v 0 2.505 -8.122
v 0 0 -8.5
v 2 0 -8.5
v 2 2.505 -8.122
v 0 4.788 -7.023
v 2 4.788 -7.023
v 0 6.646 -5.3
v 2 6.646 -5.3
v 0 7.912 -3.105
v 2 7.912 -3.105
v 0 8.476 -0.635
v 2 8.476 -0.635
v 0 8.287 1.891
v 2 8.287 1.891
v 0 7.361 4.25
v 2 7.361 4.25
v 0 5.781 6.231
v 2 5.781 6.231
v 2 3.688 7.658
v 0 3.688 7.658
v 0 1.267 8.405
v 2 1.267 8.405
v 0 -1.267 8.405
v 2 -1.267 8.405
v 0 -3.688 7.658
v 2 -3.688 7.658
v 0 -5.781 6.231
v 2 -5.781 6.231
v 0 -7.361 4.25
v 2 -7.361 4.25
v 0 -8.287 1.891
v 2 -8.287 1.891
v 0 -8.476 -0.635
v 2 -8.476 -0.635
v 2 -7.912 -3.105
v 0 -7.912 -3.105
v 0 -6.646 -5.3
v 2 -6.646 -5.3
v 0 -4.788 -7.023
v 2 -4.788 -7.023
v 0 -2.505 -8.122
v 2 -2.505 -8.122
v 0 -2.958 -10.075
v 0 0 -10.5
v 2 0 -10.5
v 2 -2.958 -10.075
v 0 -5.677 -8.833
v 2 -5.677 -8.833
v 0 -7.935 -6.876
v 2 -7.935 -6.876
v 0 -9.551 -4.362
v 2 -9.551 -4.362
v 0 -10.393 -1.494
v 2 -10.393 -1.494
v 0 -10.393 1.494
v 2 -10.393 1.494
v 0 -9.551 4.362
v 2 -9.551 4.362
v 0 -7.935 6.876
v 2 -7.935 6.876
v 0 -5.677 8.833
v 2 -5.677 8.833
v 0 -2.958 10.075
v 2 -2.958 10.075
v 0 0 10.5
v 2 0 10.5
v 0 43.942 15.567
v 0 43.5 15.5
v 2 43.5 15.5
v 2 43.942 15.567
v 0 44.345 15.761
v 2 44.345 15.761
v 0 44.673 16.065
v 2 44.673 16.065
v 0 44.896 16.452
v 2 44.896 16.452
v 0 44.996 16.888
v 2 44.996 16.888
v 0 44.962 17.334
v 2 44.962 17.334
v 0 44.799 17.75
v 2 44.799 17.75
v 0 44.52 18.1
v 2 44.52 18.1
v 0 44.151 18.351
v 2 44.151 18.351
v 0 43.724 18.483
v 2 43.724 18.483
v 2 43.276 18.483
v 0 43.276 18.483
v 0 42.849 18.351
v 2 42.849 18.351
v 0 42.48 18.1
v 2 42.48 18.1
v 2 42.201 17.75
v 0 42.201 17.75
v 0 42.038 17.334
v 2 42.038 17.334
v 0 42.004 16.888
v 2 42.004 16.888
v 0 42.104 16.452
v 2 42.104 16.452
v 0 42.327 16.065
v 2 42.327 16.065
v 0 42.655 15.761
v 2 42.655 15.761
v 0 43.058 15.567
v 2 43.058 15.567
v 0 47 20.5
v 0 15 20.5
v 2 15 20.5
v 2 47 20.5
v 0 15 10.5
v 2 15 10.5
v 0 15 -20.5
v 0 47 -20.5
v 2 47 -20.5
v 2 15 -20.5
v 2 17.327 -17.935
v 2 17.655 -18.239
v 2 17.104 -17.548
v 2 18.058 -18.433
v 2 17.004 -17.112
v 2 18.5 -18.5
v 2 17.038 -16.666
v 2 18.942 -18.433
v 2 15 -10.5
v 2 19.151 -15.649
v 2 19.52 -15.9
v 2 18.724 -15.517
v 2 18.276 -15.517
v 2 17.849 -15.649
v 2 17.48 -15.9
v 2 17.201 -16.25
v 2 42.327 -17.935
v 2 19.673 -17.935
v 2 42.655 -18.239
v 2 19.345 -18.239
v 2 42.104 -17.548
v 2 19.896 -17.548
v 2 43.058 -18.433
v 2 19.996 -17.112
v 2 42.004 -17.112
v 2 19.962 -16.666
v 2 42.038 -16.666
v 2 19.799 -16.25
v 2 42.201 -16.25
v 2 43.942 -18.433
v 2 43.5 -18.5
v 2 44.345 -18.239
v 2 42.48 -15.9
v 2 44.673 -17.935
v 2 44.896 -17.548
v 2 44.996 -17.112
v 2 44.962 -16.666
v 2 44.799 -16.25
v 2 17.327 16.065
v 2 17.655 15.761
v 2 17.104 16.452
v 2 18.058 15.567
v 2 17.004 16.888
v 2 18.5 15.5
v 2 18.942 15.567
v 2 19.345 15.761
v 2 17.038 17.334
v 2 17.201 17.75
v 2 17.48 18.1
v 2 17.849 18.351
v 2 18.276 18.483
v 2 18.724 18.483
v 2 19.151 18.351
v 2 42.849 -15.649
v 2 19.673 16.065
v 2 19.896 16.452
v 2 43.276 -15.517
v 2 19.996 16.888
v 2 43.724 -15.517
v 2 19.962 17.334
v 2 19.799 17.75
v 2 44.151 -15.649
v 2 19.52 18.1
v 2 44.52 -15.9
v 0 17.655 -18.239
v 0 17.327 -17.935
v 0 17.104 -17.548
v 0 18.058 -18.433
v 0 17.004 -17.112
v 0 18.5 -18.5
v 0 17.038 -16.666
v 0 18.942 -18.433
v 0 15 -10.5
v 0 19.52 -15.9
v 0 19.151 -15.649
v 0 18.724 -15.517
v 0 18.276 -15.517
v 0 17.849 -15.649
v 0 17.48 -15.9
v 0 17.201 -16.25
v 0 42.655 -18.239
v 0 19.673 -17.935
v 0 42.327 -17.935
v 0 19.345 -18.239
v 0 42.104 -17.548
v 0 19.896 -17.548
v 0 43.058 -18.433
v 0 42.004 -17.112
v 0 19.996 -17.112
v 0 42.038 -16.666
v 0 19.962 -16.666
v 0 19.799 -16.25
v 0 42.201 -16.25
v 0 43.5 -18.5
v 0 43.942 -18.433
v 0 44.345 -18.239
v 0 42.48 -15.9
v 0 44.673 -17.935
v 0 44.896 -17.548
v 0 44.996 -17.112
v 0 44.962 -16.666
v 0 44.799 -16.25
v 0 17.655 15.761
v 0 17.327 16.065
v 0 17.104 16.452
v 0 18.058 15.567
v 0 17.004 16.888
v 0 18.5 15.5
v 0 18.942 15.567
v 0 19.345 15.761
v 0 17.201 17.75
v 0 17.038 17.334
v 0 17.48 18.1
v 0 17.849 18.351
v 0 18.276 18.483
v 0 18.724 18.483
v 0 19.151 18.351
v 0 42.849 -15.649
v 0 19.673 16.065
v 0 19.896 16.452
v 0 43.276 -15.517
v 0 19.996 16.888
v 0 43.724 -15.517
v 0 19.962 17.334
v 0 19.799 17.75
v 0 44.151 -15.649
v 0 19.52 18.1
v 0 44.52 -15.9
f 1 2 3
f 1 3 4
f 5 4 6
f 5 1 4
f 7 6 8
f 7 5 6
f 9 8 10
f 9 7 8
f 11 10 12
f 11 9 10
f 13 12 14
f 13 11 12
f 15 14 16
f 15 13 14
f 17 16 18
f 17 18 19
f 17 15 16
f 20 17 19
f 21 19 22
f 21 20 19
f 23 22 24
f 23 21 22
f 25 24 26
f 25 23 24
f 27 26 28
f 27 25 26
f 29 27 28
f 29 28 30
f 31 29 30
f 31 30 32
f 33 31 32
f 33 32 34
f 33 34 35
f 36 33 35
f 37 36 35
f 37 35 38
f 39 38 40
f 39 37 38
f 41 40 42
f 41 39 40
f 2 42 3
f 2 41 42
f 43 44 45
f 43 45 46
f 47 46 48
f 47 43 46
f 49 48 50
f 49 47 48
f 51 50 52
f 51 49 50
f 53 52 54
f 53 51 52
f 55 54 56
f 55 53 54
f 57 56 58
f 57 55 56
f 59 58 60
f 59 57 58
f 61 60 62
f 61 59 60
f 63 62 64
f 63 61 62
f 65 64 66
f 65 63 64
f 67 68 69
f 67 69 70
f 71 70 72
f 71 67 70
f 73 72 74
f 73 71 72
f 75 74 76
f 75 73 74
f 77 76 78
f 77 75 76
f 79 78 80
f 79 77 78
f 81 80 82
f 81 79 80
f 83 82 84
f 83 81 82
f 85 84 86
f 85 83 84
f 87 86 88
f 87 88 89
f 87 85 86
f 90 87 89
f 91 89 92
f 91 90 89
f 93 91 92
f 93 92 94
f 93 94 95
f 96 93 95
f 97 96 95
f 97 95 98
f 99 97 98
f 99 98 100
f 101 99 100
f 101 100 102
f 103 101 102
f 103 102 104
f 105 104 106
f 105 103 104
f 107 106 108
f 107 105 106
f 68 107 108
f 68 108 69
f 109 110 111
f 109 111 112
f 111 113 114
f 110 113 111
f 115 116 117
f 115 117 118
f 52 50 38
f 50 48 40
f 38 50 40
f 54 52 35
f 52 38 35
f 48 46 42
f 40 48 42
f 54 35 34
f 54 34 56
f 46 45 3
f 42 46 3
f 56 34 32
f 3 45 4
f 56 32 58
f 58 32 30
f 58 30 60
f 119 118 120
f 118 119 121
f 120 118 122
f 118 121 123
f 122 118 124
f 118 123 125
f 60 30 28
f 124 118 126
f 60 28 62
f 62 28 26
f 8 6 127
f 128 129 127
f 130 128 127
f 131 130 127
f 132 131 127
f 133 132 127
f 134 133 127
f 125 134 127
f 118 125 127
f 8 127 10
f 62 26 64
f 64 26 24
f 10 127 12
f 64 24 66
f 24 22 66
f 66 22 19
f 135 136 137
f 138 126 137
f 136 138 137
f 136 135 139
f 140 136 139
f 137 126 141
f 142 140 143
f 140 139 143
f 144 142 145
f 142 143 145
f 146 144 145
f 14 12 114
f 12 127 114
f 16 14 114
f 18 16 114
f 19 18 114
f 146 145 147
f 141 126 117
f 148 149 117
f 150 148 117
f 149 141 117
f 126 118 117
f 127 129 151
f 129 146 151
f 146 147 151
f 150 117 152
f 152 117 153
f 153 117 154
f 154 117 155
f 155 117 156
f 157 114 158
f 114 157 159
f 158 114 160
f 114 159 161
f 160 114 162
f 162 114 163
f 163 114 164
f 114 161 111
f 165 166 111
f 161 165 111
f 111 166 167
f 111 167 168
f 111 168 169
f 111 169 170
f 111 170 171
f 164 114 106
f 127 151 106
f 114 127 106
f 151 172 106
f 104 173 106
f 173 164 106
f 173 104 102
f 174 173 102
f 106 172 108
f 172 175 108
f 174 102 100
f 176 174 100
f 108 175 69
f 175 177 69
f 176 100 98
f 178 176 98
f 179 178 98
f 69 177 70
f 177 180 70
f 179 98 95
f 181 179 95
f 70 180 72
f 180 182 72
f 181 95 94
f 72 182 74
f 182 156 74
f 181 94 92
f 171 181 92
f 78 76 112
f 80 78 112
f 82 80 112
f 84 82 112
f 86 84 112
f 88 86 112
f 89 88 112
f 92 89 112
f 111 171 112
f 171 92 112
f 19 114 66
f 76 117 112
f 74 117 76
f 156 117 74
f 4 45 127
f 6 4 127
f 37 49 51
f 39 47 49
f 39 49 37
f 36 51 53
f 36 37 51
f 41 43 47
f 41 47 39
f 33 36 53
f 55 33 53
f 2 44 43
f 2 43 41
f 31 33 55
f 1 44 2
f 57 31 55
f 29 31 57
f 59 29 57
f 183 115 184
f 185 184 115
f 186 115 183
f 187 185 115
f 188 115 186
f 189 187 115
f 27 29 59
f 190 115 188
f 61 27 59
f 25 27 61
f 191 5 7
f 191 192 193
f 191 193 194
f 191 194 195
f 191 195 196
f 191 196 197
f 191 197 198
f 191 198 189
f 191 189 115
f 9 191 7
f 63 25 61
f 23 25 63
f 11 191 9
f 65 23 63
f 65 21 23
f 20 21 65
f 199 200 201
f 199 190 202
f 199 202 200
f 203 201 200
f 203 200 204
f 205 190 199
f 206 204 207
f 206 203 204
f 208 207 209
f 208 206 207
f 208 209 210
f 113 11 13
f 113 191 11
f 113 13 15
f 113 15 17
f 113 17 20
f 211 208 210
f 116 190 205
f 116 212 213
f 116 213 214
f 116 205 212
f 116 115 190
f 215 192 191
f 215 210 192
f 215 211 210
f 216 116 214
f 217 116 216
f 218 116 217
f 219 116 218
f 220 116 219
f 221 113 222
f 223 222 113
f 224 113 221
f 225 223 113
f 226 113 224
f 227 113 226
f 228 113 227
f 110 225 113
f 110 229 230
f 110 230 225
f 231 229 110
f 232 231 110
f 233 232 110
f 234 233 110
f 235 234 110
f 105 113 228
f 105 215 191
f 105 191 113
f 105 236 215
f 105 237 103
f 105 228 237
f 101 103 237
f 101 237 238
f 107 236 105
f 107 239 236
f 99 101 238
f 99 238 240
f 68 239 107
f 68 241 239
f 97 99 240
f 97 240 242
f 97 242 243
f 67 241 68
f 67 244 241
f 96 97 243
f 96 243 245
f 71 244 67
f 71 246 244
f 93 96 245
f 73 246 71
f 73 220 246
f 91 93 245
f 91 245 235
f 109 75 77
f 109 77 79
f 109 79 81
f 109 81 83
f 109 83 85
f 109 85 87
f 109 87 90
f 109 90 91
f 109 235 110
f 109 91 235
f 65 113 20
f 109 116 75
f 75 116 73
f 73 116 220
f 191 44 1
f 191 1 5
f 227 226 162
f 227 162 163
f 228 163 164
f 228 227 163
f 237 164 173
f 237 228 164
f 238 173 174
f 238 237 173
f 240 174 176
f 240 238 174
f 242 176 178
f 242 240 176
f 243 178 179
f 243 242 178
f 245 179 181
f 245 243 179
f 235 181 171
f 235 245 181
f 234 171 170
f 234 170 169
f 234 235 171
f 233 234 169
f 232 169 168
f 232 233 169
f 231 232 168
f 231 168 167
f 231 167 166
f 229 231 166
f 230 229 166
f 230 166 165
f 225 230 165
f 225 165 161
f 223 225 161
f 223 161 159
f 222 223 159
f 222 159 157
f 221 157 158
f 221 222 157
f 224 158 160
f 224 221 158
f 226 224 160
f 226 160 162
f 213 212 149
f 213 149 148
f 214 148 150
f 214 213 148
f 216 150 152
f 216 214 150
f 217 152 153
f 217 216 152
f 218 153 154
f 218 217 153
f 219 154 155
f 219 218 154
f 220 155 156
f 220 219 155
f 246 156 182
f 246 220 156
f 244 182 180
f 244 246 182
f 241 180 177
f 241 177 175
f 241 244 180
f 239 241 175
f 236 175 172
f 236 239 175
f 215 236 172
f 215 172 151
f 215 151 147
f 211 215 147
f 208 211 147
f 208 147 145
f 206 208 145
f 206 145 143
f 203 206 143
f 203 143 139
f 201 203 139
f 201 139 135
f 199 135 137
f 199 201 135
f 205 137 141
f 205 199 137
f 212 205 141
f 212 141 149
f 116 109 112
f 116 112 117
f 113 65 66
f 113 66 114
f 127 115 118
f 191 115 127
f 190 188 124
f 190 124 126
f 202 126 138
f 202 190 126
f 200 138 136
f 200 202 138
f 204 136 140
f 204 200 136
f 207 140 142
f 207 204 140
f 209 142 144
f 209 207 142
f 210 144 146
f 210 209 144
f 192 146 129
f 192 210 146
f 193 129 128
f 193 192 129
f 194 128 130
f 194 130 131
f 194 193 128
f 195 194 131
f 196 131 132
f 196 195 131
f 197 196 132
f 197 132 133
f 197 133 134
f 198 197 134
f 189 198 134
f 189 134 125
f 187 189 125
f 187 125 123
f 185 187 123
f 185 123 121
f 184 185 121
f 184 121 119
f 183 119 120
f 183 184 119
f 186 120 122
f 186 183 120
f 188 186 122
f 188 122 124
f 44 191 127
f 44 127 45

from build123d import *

# Parameters (mm, degrees)
SKETCH_1_R      = 8.5
SKETCH_1_R_2    = 1.5
EXTRUDE_1_DEPTH = 2


with BuildPart() as part:
    # 草图1 → 凸台-拉伸1 (new body)
    with BuildSketch(Plane(origin=(0, 0, 0), x_dir=(0, 0, -1), z_dir=(1, 0, 0))):
        with BuildLine():
            Line((-10.5, 0), (-10.5, 15))
            Line((-10.5, 15), (-20.5, 15))
            Line((-20.5, 15), (-20.5, 47))
            Line((-20.5, 47), (20.5, 47))
            Line((20.5, 47), (20.5, 15))
            Line((20.5, 15), (10.5, 15))
            Line((10.5, 15), (10.5, 0))
            ThreePointArc((10.5, 0), (0, -10.5), (-10.5, 0))
        make_face()
        Circle(SKETCH_1_R, mode=Mode.SUBTRACT)
        with Locations((-17, 43.5)):
            Circle(SKETCH_1_R_2, mode=Mode.SUBTRACT)
        with Locations((17, 43.5)):
            Circle(SKETCH_1_R_2, mode=Mode.SUBTRACT)
        with Locations((-17, 18.5)):
            Circle(SKETCH_1_R_2, mode=Mode.SUBTRACT)
        with Locations((17, 18.5)):
            Circle(SKETCH_1_R_2, mode=Mode.SUBTRACT)
    extrude(amount=EXTRUDE_1_DEPTH)


solid = part.part
